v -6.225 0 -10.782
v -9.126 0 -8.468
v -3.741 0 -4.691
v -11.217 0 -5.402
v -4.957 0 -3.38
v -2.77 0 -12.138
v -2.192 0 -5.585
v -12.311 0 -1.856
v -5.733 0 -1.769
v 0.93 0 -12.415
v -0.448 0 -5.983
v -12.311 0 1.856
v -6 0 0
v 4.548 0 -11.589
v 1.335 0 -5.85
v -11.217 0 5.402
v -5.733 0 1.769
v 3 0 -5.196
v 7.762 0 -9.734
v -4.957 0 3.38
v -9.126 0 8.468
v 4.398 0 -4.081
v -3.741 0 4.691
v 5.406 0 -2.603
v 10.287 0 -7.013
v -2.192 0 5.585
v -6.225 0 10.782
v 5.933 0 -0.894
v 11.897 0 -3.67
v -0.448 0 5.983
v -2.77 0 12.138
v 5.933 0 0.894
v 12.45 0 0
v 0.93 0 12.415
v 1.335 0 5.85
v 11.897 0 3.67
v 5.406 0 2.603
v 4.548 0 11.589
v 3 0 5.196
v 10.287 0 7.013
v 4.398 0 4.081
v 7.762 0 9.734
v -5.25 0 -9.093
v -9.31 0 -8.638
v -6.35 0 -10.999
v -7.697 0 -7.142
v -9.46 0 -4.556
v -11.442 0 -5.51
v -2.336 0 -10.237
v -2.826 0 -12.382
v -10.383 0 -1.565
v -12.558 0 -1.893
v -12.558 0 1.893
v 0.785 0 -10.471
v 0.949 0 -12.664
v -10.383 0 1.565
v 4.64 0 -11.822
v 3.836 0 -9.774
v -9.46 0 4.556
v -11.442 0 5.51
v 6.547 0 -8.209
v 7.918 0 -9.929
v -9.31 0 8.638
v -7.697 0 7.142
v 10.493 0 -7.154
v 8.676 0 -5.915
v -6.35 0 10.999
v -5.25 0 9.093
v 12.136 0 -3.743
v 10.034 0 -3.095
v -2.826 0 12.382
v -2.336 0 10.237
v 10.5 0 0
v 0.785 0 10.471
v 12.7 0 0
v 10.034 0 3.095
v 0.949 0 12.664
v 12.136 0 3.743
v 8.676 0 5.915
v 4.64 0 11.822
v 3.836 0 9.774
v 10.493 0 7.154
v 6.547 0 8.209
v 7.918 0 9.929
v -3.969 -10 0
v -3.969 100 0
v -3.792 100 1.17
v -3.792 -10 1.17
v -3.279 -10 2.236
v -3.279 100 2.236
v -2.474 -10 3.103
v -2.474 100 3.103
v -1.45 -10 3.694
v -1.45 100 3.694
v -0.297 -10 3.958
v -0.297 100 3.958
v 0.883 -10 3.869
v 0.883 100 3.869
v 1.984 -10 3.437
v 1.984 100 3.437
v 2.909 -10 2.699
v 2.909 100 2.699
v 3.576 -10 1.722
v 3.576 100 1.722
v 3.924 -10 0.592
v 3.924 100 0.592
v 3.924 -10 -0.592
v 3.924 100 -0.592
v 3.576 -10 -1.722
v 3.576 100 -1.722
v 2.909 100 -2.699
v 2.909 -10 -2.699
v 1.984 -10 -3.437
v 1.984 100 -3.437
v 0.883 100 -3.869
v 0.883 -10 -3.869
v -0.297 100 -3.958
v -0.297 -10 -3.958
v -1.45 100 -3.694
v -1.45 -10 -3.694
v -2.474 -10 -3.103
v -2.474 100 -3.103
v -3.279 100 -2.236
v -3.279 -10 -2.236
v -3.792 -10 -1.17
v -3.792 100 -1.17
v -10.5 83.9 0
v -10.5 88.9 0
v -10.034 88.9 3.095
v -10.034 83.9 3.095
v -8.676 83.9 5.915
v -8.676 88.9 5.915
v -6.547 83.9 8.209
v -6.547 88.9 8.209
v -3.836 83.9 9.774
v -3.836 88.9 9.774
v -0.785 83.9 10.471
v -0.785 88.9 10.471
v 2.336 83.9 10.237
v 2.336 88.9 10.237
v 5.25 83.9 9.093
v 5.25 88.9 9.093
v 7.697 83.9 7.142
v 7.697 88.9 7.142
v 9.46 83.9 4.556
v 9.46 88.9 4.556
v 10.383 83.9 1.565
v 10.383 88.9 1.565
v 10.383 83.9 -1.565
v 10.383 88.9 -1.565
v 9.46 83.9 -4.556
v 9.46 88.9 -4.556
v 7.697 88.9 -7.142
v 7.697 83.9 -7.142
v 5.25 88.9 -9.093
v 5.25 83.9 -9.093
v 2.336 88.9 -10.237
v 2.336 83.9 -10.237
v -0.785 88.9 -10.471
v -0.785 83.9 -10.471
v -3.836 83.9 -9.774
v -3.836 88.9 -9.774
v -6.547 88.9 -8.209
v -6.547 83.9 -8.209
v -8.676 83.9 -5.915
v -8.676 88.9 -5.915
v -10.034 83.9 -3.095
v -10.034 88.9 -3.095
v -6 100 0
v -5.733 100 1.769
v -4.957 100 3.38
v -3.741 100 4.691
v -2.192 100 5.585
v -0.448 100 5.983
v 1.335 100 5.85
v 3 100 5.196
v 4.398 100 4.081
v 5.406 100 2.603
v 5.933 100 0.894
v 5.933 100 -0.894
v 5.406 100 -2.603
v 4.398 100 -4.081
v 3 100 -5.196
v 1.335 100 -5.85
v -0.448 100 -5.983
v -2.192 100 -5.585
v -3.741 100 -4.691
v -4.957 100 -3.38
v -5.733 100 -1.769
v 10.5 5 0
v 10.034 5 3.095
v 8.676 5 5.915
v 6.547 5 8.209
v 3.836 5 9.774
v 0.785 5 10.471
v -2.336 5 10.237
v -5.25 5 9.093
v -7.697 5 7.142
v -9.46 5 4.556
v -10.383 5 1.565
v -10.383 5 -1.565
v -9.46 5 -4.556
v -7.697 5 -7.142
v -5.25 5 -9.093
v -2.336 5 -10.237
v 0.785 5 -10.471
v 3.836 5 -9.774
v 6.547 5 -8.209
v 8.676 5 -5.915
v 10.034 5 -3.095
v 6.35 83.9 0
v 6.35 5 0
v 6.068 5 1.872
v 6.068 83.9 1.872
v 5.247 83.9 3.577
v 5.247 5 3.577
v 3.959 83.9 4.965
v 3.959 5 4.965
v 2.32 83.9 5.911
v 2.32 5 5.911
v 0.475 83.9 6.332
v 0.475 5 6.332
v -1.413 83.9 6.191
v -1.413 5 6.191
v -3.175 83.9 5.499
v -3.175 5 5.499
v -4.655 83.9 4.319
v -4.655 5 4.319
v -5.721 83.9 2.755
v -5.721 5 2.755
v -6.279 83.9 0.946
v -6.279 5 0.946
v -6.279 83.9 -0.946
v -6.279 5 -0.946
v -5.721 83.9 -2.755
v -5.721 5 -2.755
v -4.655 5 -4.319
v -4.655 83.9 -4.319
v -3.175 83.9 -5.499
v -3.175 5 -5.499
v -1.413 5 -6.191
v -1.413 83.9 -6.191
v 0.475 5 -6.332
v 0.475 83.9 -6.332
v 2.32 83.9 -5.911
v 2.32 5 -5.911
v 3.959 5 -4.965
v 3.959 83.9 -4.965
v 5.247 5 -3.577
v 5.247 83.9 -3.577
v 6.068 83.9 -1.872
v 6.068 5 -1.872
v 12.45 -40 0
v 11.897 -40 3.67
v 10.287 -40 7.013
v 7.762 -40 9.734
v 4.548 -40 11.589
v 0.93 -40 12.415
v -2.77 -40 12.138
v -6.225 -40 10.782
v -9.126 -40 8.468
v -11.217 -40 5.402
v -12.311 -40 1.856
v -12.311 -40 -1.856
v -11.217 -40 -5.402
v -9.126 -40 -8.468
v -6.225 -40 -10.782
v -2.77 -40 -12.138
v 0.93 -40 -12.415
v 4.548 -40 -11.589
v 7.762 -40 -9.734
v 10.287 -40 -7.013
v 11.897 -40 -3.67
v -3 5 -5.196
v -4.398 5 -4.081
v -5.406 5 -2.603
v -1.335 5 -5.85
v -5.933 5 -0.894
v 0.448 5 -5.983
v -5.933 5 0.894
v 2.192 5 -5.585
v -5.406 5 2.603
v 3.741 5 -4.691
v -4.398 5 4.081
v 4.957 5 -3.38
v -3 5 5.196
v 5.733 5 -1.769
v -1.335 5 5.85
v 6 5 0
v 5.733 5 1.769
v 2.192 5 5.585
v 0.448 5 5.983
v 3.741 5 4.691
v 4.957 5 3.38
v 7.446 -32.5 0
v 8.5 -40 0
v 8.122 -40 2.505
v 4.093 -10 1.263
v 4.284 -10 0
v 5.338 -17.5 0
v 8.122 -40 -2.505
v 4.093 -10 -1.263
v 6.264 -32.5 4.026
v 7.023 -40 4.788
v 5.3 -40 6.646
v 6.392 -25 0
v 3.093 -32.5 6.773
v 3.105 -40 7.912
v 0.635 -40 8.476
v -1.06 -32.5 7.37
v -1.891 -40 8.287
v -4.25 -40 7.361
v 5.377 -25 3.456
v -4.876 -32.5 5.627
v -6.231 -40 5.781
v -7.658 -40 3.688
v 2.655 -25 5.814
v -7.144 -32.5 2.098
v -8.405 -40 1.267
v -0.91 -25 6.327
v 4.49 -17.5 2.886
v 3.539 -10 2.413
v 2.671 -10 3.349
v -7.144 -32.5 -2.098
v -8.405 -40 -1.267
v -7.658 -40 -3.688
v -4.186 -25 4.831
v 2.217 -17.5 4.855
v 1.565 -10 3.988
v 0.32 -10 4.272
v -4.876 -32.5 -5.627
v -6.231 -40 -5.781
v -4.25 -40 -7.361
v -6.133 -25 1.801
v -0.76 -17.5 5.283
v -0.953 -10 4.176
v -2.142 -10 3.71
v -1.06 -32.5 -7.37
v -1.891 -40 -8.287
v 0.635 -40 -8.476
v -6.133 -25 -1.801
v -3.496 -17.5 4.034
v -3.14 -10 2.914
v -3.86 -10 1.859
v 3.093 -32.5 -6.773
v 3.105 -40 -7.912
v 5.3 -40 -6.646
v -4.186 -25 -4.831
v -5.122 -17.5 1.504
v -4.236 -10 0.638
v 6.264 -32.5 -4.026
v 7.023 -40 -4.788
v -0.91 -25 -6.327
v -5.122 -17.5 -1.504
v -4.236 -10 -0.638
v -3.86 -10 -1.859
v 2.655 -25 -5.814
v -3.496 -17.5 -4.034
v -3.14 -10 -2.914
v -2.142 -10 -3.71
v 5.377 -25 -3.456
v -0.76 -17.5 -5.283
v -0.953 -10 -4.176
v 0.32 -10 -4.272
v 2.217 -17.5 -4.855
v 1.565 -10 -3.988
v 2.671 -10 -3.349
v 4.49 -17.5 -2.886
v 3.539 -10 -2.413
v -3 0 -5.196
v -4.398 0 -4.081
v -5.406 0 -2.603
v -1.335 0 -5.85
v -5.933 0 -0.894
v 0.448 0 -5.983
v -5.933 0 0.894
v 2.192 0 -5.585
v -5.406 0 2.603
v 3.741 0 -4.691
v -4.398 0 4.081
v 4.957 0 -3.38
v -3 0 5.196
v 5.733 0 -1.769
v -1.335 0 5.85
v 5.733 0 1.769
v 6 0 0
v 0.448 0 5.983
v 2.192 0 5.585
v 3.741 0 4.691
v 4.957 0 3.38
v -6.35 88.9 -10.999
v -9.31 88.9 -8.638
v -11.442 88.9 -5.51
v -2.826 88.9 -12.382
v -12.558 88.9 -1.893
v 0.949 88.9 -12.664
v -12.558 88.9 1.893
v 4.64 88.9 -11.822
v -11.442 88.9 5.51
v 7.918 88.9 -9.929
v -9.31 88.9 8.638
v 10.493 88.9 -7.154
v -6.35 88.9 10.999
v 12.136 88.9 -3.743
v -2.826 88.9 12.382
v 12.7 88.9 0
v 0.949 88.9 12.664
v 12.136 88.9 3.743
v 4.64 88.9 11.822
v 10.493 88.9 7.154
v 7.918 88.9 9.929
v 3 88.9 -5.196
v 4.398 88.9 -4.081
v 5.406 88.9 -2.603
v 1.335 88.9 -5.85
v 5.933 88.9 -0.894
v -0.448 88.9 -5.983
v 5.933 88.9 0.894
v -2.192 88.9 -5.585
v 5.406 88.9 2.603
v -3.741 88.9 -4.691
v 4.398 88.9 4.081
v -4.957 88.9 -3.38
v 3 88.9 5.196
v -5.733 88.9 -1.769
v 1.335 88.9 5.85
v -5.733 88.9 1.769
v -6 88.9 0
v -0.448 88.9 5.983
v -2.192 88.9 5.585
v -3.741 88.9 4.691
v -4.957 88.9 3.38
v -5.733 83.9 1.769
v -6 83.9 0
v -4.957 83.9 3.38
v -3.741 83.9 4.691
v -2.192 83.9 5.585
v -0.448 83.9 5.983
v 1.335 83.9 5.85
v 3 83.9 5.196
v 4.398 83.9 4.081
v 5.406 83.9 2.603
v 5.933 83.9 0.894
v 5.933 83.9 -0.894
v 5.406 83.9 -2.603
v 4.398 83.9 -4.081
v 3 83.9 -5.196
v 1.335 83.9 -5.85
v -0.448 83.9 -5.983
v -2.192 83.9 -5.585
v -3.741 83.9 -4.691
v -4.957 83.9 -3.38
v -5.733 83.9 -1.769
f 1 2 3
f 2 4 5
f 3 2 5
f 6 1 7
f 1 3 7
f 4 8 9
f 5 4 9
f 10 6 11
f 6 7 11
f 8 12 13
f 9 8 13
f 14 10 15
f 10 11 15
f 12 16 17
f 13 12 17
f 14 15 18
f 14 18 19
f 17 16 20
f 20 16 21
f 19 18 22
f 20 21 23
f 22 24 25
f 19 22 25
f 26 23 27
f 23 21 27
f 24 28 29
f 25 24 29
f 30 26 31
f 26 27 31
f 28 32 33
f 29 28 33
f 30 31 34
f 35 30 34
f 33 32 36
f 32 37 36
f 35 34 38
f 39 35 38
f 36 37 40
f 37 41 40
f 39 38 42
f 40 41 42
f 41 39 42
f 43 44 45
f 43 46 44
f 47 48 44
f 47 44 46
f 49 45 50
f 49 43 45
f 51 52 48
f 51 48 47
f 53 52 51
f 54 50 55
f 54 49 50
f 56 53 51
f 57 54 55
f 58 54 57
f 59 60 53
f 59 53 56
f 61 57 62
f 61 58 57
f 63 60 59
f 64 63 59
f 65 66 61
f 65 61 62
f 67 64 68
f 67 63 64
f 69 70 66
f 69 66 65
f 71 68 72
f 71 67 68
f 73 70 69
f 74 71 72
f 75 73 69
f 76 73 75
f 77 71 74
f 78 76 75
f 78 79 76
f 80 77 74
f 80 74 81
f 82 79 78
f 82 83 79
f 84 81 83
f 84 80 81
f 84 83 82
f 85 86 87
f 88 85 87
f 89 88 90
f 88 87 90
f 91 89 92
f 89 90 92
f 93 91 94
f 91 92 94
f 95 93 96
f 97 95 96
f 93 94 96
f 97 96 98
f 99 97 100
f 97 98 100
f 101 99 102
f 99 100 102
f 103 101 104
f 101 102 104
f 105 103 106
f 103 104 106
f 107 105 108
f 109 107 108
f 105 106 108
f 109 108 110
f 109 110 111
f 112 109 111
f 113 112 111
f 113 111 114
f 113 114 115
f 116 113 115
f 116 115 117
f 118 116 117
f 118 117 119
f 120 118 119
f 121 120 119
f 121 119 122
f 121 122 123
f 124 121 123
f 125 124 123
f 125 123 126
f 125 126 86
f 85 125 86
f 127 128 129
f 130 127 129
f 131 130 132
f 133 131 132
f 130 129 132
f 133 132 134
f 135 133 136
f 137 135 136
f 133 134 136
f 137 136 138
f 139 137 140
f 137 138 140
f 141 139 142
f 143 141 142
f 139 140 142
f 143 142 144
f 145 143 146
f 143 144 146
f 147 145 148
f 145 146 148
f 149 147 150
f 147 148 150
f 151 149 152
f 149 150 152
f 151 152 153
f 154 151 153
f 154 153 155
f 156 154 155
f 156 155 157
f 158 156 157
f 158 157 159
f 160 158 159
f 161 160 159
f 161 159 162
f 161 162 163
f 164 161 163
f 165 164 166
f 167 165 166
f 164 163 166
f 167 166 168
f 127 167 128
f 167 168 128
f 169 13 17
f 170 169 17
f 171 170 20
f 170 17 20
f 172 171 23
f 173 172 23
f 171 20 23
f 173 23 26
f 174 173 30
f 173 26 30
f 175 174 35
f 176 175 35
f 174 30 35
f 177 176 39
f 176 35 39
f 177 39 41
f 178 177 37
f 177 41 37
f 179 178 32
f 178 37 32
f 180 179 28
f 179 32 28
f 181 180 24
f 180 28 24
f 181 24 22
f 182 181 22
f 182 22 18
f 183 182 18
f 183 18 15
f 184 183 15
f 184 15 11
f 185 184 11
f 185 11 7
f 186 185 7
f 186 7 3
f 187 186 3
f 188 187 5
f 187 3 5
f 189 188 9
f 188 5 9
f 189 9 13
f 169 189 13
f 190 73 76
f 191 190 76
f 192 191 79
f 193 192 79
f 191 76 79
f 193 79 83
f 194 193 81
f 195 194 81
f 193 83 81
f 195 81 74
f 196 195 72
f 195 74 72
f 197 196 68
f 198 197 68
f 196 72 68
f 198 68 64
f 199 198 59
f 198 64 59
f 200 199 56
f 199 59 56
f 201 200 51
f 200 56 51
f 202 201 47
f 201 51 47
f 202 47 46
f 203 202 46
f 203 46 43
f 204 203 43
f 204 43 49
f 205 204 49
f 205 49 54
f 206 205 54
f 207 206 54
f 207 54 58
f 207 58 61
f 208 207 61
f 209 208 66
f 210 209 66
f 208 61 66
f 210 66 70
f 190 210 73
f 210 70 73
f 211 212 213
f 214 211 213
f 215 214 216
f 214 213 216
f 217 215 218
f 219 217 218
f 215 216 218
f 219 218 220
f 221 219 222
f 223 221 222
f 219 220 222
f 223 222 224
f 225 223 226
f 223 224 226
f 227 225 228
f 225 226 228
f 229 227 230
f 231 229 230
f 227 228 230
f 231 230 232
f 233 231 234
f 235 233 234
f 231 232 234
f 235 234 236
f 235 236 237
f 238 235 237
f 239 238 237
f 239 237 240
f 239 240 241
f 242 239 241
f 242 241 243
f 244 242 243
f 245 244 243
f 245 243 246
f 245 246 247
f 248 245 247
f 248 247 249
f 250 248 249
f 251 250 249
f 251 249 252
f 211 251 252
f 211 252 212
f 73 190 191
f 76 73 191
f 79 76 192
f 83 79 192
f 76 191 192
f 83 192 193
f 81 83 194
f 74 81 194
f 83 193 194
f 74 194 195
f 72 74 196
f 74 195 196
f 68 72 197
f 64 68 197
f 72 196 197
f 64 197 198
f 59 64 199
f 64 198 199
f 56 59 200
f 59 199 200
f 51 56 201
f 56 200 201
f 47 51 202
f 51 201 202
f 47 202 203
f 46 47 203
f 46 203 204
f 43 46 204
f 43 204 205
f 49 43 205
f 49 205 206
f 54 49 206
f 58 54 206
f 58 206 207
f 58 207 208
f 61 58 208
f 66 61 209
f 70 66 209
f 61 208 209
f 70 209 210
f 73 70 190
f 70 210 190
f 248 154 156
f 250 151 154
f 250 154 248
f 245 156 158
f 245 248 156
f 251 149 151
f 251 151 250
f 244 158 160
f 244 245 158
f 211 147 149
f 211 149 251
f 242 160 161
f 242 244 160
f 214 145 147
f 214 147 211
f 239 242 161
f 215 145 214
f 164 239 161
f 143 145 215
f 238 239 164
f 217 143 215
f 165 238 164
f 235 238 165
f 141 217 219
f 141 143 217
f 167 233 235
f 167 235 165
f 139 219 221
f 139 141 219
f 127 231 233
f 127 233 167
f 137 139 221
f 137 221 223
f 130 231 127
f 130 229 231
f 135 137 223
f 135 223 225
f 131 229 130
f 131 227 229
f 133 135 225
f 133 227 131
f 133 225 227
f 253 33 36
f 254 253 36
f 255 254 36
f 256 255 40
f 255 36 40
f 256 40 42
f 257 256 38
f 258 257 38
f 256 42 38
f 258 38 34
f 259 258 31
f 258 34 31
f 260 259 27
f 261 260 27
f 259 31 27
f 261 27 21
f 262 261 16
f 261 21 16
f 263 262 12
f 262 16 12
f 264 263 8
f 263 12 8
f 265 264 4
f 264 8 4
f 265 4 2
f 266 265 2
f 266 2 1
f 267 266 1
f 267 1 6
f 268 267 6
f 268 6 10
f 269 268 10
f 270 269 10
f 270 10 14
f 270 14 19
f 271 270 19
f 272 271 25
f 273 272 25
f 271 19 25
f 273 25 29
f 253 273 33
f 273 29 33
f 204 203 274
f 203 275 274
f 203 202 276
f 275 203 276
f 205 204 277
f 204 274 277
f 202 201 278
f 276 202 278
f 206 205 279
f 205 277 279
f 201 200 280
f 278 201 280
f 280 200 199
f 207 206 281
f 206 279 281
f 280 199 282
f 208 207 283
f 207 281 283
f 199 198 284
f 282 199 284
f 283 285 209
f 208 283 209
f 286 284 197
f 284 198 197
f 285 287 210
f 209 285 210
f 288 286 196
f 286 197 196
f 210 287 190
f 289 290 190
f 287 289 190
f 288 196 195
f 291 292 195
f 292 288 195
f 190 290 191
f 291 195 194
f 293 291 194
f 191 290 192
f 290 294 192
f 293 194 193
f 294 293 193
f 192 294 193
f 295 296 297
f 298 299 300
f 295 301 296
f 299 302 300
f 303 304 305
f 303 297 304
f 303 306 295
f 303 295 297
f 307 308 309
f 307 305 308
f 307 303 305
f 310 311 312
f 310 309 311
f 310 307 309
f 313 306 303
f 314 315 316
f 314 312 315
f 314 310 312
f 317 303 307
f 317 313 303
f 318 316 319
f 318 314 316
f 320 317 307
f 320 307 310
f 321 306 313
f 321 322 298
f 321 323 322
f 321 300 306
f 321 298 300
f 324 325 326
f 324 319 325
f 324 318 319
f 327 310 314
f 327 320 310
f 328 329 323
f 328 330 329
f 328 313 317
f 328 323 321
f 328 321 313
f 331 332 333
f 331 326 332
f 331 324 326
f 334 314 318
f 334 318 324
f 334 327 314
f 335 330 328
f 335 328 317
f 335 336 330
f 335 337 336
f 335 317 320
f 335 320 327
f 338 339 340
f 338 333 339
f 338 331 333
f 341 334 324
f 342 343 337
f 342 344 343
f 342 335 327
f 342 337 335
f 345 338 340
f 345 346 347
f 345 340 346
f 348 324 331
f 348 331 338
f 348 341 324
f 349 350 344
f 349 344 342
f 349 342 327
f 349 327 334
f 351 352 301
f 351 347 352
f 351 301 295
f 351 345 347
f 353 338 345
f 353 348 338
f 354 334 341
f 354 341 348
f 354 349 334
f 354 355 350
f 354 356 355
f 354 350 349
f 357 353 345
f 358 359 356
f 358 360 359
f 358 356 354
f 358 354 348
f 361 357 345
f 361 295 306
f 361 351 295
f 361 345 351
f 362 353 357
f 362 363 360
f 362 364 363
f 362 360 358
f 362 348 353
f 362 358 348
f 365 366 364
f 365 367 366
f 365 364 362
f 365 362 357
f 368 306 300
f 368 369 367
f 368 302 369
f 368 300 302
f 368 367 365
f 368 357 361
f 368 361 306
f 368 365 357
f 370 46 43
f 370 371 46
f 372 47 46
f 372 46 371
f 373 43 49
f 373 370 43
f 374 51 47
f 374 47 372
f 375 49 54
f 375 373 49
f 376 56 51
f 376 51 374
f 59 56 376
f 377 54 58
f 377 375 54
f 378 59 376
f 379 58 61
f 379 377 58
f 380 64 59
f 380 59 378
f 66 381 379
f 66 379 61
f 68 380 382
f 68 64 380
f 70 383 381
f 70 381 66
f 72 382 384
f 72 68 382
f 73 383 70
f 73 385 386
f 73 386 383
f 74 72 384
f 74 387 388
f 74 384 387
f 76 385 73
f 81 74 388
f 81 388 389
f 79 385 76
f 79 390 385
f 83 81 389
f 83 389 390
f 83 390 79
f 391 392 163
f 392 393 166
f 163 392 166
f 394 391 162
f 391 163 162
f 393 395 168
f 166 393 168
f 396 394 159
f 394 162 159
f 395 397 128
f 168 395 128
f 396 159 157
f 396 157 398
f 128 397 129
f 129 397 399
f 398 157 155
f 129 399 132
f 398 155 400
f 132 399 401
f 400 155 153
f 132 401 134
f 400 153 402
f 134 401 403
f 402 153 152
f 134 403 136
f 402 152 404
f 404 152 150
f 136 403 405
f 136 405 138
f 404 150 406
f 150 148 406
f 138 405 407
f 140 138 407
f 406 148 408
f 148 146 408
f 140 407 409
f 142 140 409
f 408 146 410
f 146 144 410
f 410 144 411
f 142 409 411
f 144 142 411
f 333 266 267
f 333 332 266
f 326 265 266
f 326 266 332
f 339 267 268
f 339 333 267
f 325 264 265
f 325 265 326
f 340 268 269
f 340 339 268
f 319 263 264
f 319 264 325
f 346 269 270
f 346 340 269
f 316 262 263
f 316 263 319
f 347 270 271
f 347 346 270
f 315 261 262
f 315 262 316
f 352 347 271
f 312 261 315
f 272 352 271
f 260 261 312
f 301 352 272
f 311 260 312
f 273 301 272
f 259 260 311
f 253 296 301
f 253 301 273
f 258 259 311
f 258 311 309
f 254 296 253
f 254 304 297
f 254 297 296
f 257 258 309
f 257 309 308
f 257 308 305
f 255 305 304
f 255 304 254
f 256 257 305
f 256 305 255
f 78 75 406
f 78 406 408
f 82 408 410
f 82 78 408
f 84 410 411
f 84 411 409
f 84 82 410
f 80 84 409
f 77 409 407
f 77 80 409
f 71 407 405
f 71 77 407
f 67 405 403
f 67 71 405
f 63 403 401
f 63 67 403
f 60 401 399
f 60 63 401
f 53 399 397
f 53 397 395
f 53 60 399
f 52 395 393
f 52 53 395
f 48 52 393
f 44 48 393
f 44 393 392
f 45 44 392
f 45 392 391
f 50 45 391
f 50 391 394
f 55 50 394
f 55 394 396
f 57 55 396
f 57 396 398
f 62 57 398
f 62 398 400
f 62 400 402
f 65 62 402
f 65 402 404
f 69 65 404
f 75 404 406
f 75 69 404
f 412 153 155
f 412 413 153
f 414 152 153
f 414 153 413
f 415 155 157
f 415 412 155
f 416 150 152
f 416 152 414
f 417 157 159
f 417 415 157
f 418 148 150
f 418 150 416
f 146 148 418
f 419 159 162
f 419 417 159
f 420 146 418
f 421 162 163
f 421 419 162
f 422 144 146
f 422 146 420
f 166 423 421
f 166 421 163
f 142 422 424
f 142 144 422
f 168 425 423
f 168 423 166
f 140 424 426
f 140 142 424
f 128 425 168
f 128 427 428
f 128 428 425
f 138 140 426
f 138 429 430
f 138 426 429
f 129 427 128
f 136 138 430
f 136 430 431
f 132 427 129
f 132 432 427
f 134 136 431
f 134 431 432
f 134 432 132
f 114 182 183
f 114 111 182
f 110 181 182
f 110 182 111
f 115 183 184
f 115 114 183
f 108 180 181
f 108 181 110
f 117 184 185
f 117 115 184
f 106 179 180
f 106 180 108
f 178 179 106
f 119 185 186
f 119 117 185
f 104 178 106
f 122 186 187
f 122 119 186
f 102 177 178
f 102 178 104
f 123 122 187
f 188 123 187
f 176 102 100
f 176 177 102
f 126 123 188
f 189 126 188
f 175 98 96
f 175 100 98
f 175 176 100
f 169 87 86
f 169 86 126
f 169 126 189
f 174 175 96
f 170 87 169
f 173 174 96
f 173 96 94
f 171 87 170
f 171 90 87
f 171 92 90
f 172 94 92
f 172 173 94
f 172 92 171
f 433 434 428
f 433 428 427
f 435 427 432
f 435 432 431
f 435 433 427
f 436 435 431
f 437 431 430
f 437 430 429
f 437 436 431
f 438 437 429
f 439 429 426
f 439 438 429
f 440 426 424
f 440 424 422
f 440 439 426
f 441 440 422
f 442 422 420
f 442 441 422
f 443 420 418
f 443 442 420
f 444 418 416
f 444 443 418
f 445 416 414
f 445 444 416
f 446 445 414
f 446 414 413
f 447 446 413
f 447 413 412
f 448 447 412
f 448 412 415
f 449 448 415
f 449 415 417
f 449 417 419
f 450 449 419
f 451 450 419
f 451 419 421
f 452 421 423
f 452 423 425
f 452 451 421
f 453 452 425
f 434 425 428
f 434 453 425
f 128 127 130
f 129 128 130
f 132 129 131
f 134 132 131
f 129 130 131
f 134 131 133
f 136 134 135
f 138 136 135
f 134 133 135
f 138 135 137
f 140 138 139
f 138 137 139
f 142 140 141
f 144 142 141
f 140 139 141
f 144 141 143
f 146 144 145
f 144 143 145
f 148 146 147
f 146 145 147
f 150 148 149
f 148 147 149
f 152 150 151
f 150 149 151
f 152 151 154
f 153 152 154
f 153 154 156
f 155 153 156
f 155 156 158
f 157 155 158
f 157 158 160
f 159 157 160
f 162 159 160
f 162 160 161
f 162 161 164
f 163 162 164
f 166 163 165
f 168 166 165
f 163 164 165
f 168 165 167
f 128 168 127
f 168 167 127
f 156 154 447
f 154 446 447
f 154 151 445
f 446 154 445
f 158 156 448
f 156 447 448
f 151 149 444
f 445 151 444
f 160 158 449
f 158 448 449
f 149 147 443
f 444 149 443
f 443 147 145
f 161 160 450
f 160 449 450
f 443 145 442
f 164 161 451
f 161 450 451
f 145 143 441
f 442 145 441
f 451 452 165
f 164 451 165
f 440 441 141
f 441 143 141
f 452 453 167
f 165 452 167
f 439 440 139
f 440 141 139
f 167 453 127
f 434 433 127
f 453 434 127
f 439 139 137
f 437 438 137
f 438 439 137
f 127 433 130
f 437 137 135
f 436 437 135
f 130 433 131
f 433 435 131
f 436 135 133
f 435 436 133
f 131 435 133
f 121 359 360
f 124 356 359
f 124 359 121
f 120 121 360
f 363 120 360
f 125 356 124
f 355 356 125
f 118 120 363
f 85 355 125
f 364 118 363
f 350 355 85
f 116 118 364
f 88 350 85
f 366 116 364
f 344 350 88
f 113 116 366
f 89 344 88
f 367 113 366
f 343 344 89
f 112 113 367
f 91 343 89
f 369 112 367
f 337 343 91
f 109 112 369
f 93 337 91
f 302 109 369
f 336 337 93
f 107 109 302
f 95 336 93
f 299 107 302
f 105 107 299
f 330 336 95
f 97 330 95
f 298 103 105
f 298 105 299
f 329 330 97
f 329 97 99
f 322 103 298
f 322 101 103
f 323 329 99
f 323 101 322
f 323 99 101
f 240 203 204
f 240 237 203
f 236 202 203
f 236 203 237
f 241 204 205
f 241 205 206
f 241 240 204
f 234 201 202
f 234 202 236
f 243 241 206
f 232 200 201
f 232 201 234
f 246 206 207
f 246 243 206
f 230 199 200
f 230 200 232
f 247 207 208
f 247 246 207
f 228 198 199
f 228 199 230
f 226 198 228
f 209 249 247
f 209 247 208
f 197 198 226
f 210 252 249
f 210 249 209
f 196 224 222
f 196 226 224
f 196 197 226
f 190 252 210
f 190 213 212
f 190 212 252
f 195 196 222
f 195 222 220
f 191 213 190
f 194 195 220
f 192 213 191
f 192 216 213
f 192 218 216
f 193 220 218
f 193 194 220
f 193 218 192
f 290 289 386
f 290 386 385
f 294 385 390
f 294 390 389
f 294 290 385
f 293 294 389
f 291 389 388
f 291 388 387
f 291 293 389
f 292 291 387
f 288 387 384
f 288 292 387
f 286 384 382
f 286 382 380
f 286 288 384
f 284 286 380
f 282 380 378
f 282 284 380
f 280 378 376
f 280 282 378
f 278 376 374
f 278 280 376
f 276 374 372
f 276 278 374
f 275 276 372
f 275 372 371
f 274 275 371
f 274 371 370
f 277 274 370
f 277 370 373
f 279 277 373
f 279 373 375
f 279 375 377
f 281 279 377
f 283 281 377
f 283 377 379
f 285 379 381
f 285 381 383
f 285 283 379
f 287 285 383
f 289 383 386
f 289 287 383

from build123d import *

# Parameters (mm, degrees)
F0_R      = 12.7
F0_R_2    = 6.35
F1_DEPTH  = 88.9
F2_R      = 12.45
F3_DEPTH  = 40
F4_R      = 8.5
F5_DEPTH  = 30
F5_TAPER  = 8
F6_R      = 6
F7_DEPTH  = 100
F8_R      = 3.96875
F9_DEPTH  = 140.0010001
F10_R     = 10.5
F11_DEPTH = 5
F12_R     = 10.5
F12_R_2   = 6
F13_DEPTH = 5
F14_R     = 10.5
F15_DEPTH = 5
F16_R     = 10.5
F16_R_2   = 6
F17_DEPTH = 5


with BuildPart() as f1:
    # F0 (on Front) → F1 (new body)
    with BuildSketch(Plane.XZ):
        Circle(F0_R)
        Circle(F0_R_2, mode=Mode.SUBTRACT)
    extrude(amount=-F1_DEPTH)

    # F10 (on face) → F11 (cut)
    with BuildSketch(Plane.XZ):
        Circle(F10_R)
    extrude(amount=-F11_DEPTH, mode=Mode.SUBTRACT)

    # F14 (on face) → F15 (cut)
    with BuildSketch(Plane(origin=(0, 88.9, 0), x_dir=(-1, 0, 0), z_dir=(0, 1, 0))):
        Circle(F14_R)
    extrude(amount=-F15_DEPTH, mode=Mode.SUBTRACT)


with BuildPart() as f3:
    # F2 (on Front) → F3 (new body)
    with BuildSketch(Plane.XZ):
        Circle(F2_R)
    extrude(amount=F3_DEPTH)

    # F4 (on face) → F5 (cut)
    with BuildSketch(Plane.XZ.offset(40)):
        Circle(F4_R)
    extrude(amount=-F5_DEPTH, taper=F5_TAPER, mode=Mode.SUBTRACT)

    # F6 (on face) → F7 (join)
    with BuildSketch(Plane(origin=(0, 0, 0), x_dir=(-1, 0, 0), z_dir=(0, 1, 0))):
        Circle(F6_R)
    extrude(amount=F7_DEPTH)

    # F8 (on face) → F9 (cut, through all)
    with BuildSketch(Plane(origin=(0, 100, 0), x_dir=(-1, 0, 0), z_dir=(0, 1, 0))):
        Circle(F8_R)
    extrude(amount=-F9_DEPTH, mode=Mode.SUBTRACT)


with BuildPart() as f13:
    # F12 (on face) → F13 (new body)
    with BuildSketch(Plane.XZ.offset(-5)):
        Circle(F12_R)
        Circle(F12_R_2, mode=Mode.SUBTRACT)
    extrude(amount=F13_DEPTH)


with BuildPart() as f17:
    # F16 (on face) → F17 (new body)
    with BuildSketch(Plane(origin=(0, 83.9, 0), x_dir=(-1, 0, 0), z_dir=(0, 1, 0))):
        Circle(F16_R)
        Circle(F16_R_2, mode=Mode.SUBTRACT)
    extrude(amount=F17_DEPTH)


solid = Compound([f1.part, f3.part, f13.part, f17.part])
